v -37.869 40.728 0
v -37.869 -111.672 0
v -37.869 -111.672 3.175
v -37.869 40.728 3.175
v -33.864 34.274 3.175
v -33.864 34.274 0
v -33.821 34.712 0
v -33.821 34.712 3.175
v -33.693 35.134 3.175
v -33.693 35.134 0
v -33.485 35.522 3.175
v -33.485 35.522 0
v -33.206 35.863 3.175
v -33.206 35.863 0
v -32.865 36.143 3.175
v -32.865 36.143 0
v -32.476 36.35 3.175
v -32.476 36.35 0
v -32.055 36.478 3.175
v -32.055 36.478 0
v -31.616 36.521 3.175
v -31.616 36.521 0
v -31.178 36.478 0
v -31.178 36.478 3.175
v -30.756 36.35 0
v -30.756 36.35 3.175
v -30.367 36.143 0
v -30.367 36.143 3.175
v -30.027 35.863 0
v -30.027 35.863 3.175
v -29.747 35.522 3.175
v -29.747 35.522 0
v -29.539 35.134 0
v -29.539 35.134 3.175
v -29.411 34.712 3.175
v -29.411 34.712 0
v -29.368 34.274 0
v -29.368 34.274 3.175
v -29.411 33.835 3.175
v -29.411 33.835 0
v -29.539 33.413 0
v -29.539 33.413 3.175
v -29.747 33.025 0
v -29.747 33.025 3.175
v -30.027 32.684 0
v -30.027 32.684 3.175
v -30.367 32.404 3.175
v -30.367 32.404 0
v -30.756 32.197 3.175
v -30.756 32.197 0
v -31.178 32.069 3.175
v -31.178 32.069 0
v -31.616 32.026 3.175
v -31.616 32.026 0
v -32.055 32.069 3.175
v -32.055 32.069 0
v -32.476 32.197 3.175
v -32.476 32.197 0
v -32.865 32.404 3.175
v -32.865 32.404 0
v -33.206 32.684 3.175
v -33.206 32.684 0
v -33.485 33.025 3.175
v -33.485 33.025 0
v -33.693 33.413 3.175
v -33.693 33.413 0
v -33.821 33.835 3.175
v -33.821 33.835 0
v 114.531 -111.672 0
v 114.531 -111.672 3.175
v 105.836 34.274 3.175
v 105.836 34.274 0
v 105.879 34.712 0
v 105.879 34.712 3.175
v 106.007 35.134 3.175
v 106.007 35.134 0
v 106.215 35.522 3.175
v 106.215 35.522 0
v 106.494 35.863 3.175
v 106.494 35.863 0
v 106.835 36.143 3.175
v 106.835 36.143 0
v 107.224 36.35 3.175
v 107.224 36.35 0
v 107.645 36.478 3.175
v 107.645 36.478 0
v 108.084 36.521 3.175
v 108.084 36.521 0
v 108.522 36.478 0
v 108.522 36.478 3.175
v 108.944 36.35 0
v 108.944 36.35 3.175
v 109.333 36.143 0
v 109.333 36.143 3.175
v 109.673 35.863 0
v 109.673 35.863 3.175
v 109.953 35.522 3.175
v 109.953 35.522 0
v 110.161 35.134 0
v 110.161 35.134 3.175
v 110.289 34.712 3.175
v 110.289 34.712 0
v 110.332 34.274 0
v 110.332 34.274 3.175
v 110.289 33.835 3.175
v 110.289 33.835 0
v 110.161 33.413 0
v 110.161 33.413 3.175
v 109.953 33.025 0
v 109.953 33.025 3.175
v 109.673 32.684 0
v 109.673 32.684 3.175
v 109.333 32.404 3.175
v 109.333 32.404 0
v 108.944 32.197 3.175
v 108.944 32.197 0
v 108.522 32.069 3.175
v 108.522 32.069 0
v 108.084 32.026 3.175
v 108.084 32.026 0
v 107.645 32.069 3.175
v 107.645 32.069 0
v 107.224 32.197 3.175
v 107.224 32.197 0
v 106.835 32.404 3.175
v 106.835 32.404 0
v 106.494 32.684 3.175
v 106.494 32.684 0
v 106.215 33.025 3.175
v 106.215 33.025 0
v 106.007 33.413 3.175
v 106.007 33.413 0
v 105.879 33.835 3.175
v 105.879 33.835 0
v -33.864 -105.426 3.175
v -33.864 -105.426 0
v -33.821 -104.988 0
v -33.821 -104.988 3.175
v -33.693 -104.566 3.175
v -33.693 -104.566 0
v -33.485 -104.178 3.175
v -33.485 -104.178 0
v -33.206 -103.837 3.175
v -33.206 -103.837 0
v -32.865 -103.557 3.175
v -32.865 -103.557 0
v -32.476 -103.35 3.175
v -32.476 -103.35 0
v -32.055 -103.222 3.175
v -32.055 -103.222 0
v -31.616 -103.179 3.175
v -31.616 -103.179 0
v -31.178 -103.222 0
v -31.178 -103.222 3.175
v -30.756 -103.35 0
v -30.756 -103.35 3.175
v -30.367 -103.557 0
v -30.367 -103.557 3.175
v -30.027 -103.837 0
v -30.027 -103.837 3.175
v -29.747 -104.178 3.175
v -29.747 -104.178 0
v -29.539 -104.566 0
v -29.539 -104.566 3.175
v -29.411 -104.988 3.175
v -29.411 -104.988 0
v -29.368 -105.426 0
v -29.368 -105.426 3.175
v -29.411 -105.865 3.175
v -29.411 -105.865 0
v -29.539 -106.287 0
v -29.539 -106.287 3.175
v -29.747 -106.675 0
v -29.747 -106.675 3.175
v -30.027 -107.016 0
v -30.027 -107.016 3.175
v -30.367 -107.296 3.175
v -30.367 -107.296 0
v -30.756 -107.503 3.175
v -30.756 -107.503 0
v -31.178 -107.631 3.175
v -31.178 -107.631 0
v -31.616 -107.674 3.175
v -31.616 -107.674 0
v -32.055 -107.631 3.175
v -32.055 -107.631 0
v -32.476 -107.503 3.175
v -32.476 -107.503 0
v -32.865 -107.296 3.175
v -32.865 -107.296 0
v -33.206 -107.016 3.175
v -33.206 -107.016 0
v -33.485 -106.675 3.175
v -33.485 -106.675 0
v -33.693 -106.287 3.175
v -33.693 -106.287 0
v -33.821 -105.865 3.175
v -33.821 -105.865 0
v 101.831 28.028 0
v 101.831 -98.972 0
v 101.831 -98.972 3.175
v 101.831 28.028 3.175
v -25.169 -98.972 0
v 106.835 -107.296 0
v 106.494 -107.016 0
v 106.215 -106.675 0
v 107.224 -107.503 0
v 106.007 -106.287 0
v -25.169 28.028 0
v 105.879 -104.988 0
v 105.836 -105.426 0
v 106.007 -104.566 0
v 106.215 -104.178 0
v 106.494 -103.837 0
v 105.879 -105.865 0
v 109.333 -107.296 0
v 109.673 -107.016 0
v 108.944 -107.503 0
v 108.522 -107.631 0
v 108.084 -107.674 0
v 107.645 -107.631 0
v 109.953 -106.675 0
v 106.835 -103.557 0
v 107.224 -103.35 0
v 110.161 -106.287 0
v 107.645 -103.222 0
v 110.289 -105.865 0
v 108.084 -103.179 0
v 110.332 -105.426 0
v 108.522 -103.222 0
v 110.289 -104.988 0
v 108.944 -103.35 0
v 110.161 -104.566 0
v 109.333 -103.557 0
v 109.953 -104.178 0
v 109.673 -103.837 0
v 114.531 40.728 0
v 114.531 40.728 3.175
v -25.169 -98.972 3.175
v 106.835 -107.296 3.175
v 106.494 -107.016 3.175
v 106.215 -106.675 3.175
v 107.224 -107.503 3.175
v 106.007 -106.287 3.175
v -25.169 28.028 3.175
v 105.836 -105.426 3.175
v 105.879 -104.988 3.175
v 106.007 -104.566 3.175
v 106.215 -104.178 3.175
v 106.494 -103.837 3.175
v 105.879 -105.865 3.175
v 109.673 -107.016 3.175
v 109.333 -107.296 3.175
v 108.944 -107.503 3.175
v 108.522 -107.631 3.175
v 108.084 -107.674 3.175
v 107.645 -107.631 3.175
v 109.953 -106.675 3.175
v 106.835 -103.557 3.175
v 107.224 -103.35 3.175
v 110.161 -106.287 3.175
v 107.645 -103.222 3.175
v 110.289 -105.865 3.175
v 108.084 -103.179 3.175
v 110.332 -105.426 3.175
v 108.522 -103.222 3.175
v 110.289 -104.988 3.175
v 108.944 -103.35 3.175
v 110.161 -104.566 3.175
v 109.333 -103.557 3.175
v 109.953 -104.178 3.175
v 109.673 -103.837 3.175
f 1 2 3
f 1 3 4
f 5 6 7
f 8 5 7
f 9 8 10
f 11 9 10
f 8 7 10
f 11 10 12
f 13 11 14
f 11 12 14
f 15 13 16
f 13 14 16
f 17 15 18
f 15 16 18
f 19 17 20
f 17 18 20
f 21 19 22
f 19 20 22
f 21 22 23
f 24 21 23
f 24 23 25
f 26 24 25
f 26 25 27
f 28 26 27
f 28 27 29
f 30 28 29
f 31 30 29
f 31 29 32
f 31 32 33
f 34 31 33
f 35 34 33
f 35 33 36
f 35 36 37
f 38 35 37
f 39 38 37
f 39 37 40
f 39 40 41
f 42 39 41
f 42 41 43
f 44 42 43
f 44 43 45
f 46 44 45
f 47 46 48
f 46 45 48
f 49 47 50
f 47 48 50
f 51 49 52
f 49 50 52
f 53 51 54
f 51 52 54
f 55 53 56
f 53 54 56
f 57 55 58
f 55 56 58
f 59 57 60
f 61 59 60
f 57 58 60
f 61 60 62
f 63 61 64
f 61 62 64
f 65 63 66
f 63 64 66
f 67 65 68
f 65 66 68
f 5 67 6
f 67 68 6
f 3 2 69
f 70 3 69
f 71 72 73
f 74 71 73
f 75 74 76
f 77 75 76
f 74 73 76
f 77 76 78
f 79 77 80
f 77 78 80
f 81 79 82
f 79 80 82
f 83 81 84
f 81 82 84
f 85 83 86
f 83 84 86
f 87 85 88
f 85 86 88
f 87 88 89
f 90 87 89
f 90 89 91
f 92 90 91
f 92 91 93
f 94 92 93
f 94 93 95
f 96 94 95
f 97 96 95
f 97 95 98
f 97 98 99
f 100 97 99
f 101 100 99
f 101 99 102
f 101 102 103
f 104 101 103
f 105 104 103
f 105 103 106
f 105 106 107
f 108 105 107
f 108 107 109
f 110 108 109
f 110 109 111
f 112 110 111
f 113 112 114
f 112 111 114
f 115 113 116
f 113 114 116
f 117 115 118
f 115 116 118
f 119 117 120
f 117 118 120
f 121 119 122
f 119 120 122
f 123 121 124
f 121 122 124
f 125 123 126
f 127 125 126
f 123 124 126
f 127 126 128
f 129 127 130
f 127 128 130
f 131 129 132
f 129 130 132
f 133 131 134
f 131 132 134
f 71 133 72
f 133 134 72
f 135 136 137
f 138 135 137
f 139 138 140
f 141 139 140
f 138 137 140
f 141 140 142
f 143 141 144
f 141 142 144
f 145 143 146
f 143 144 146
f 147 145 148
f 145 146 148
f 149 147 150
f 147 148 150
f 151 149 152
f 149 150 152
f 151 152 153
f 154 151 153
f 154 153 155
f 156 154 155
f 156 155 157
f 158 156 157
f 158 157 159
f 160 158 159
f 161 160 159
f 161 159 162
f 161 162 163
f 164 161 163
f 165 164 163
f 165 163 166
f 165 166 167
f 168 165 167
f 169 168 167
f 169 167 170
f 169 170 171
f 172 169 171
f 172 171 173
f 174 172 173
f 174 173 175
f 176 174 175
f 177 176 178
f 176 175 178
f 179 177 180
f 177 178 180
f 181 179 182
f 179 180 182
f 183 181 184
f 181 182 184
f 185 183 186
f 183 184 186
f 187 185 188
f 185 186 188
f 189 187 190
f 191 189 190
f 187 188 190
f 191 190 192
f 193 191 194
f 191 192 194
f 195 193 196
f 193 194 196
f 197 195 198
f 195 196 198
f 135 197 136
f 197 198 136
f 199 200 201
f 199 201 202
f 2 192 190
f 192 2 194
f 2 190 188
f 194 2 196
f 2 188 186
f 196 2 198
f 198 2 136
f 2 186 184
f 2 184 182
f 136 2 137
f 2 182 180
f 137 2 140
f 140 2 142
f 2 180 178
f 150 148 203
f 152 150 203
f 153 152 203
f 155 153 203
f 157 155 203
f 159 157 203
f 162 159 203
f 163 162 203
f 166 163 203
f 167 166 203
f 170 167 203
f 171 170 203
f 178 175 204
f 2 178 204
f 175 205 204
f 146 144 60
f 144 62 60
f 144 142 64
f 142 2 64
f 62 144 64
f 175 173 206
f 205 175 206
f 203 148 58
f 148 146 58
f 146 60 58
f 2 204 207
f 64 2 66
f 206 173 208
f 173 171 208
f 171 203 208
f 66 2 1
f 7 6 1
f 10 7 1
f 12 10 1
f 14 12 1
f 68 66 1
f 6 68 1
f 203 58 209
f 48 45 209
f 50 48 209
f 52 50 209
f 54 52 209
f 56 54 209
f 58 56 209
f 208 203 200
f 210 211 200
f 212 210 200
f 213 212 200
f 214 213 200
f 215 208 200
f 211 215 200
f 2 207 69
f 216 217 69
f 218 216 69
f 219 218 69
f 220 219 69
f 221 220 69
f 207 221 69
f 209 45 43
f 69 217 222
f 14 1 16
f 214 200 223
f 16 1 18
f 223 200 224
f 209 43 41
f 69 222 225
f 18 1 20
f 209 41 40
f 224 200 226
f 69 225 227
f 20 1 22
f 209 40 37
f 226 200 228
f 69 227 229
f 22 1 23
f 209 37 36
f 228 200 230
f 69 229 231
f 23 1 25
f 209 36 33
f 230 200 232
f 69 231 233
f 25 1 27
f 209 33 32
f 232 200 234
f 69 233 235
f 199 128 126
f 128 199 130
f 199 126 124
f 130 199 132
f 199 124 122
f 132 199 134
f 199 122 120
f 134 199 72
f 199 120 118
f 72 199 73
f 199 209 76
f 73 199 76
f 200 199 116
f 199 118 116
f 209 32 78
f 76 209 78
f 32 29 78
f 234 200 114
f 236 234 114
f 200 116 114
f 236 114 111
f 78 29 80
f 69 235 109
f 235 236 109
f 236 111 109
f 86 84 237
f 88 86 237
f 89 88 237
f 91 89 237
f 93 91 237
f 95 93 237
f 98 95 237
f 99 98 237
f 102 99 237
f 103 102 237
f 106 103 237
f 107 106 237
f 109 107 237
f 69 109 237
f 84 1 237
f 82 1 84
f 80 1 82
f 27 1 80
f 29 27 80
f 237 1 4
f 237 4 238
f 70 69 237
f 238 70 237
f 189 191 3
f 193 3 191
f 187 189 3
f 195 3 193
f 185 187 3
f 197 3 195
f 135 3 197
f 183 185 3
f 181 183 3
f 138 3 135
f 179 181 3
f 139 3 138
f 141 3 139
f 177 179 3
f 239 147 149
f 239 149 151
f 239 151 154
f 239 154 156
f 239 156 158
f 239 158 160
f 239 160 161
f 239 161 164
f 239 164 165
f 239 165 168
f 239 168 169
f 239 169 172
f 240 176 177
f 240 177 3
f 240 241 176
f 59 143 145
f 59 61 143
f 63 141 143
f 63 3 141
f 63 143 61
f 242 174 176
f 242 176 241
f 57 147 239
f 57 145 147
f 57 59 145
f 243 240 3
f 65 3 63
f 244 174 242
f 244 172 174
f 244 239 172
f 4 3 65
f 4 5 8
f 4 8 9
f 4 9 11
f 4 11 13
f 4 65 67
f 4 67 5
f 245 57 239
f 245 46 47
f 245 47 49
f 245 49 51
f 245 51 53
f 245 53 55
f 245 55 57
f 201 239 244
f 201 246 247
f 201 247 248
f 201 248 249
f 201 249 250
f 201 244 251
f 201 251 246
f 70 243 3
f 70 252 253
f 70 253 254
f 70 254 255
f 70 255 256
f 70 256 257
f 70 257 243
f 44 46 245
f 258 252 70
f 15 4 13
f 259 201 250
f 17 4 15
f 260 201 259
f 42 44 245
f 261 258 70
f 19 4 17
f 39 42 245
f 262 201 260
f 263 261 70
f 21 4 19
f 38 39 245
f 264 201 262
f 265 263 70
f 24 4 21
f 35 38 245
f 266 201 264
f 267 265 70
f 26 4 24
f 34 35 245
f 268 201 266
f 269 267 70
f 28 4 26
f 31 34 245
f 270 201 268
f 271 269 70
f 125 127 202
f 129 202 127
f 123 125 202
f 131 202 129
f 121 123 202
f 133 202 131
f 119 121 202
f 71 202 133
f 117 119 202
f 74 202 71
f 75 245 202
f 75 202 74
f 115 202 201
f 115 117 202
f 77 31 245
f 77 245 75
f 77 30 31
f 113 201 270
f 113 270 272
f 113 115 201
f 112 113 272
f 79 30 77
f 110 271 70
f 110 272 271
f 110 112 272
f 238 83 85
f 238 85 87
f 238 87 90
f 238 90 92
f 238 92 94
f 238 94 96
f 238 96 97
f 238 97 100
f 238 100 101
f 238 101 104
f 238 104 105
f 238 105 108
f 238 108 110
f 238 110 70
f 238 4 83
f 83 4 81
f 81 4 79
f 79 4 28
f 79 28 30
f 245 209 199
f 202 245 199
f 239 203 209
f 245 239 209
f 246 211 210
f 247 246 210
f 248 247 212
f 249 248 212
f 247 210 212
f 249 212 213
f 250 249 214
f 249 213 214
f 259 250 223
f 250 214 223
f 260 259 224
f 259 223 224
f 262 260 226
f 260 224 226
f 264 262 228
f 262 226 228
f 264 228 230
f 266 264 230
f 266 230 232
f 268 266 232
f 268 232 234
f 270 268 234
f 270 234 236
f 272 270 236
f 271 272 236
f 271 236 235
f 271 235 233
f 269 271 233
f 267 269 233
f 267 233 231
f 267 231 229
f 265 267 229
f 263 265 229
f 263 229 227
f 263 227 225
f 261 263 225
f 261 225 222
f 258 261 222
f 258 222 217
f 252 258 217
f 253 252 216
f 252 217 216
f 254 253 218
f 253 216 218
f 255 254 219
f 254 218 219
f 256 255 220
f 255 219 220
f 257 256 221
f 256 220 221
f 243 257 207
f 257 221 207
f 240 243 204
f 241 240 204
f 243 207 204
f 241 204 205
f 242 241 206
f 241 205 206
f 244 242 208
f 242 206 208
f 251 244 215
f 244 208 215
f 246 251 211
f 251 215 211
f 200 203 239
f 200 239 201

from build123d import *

# Parameters (mm, degrees)
SKETCH1_W             = 152.4
SKETCH1_H             = 152.4
SKETCH1_W_2           = 127
SKETCH1_H_2           = 127
BOSS_EXTRUDE1_DEPTH   = 3.175
F_8_CLEARANCE_HOLE2_D = 4.4958
LPATTERN1_COUNT       = 2
LPATTERN1_PITCH       = 139.7
LPATTERN1_COUNT_DIR2  = 2
LPATTERN1_PITCH_DIR2  = 139.7


with BuildPart() as part:
    # Sketch1 → Boss-Extrude1 (new body)
    with BuildSketch(Plane.XY):
        with Locations((38.331291391, -35.471688742)):
            Rectangle(SKETCH1_W, SKETCH1_H)
        with Locations((38.331291391, -35.471688742)):
            Rectangle(SKETCH1_W_2, SKETCH1_H_2, mode=Mode.SUBTRACT)
    extrude(amount=BOSS_EXTRUDE1_DEPTH)

    # #8 Clearance Hole2 (through all)
    with Locations(Plane.XY.offset(3.175)):
        with Locations((-31.616116629, 34.273559139)):
            f_8_clearance_hole2 = Hole(F_8_CLEARANCE_HOLE2_D / 2)

    # LPattern1: 8 Clearance Hole2 2 × 2
    with Locations(*[(i * LPATTERN1_PITCH, -j * LPATTERN1_PITCH_DIR2, 0) for i in range(LPATTERN1_COUNT) for j in range(LPATTERN1_COUNT_DIR2) if (i, j) != (0, 0)]):
        add(f_8_clearance_hole2, mode=Mode.SUBTRACT)


solid = part.part
